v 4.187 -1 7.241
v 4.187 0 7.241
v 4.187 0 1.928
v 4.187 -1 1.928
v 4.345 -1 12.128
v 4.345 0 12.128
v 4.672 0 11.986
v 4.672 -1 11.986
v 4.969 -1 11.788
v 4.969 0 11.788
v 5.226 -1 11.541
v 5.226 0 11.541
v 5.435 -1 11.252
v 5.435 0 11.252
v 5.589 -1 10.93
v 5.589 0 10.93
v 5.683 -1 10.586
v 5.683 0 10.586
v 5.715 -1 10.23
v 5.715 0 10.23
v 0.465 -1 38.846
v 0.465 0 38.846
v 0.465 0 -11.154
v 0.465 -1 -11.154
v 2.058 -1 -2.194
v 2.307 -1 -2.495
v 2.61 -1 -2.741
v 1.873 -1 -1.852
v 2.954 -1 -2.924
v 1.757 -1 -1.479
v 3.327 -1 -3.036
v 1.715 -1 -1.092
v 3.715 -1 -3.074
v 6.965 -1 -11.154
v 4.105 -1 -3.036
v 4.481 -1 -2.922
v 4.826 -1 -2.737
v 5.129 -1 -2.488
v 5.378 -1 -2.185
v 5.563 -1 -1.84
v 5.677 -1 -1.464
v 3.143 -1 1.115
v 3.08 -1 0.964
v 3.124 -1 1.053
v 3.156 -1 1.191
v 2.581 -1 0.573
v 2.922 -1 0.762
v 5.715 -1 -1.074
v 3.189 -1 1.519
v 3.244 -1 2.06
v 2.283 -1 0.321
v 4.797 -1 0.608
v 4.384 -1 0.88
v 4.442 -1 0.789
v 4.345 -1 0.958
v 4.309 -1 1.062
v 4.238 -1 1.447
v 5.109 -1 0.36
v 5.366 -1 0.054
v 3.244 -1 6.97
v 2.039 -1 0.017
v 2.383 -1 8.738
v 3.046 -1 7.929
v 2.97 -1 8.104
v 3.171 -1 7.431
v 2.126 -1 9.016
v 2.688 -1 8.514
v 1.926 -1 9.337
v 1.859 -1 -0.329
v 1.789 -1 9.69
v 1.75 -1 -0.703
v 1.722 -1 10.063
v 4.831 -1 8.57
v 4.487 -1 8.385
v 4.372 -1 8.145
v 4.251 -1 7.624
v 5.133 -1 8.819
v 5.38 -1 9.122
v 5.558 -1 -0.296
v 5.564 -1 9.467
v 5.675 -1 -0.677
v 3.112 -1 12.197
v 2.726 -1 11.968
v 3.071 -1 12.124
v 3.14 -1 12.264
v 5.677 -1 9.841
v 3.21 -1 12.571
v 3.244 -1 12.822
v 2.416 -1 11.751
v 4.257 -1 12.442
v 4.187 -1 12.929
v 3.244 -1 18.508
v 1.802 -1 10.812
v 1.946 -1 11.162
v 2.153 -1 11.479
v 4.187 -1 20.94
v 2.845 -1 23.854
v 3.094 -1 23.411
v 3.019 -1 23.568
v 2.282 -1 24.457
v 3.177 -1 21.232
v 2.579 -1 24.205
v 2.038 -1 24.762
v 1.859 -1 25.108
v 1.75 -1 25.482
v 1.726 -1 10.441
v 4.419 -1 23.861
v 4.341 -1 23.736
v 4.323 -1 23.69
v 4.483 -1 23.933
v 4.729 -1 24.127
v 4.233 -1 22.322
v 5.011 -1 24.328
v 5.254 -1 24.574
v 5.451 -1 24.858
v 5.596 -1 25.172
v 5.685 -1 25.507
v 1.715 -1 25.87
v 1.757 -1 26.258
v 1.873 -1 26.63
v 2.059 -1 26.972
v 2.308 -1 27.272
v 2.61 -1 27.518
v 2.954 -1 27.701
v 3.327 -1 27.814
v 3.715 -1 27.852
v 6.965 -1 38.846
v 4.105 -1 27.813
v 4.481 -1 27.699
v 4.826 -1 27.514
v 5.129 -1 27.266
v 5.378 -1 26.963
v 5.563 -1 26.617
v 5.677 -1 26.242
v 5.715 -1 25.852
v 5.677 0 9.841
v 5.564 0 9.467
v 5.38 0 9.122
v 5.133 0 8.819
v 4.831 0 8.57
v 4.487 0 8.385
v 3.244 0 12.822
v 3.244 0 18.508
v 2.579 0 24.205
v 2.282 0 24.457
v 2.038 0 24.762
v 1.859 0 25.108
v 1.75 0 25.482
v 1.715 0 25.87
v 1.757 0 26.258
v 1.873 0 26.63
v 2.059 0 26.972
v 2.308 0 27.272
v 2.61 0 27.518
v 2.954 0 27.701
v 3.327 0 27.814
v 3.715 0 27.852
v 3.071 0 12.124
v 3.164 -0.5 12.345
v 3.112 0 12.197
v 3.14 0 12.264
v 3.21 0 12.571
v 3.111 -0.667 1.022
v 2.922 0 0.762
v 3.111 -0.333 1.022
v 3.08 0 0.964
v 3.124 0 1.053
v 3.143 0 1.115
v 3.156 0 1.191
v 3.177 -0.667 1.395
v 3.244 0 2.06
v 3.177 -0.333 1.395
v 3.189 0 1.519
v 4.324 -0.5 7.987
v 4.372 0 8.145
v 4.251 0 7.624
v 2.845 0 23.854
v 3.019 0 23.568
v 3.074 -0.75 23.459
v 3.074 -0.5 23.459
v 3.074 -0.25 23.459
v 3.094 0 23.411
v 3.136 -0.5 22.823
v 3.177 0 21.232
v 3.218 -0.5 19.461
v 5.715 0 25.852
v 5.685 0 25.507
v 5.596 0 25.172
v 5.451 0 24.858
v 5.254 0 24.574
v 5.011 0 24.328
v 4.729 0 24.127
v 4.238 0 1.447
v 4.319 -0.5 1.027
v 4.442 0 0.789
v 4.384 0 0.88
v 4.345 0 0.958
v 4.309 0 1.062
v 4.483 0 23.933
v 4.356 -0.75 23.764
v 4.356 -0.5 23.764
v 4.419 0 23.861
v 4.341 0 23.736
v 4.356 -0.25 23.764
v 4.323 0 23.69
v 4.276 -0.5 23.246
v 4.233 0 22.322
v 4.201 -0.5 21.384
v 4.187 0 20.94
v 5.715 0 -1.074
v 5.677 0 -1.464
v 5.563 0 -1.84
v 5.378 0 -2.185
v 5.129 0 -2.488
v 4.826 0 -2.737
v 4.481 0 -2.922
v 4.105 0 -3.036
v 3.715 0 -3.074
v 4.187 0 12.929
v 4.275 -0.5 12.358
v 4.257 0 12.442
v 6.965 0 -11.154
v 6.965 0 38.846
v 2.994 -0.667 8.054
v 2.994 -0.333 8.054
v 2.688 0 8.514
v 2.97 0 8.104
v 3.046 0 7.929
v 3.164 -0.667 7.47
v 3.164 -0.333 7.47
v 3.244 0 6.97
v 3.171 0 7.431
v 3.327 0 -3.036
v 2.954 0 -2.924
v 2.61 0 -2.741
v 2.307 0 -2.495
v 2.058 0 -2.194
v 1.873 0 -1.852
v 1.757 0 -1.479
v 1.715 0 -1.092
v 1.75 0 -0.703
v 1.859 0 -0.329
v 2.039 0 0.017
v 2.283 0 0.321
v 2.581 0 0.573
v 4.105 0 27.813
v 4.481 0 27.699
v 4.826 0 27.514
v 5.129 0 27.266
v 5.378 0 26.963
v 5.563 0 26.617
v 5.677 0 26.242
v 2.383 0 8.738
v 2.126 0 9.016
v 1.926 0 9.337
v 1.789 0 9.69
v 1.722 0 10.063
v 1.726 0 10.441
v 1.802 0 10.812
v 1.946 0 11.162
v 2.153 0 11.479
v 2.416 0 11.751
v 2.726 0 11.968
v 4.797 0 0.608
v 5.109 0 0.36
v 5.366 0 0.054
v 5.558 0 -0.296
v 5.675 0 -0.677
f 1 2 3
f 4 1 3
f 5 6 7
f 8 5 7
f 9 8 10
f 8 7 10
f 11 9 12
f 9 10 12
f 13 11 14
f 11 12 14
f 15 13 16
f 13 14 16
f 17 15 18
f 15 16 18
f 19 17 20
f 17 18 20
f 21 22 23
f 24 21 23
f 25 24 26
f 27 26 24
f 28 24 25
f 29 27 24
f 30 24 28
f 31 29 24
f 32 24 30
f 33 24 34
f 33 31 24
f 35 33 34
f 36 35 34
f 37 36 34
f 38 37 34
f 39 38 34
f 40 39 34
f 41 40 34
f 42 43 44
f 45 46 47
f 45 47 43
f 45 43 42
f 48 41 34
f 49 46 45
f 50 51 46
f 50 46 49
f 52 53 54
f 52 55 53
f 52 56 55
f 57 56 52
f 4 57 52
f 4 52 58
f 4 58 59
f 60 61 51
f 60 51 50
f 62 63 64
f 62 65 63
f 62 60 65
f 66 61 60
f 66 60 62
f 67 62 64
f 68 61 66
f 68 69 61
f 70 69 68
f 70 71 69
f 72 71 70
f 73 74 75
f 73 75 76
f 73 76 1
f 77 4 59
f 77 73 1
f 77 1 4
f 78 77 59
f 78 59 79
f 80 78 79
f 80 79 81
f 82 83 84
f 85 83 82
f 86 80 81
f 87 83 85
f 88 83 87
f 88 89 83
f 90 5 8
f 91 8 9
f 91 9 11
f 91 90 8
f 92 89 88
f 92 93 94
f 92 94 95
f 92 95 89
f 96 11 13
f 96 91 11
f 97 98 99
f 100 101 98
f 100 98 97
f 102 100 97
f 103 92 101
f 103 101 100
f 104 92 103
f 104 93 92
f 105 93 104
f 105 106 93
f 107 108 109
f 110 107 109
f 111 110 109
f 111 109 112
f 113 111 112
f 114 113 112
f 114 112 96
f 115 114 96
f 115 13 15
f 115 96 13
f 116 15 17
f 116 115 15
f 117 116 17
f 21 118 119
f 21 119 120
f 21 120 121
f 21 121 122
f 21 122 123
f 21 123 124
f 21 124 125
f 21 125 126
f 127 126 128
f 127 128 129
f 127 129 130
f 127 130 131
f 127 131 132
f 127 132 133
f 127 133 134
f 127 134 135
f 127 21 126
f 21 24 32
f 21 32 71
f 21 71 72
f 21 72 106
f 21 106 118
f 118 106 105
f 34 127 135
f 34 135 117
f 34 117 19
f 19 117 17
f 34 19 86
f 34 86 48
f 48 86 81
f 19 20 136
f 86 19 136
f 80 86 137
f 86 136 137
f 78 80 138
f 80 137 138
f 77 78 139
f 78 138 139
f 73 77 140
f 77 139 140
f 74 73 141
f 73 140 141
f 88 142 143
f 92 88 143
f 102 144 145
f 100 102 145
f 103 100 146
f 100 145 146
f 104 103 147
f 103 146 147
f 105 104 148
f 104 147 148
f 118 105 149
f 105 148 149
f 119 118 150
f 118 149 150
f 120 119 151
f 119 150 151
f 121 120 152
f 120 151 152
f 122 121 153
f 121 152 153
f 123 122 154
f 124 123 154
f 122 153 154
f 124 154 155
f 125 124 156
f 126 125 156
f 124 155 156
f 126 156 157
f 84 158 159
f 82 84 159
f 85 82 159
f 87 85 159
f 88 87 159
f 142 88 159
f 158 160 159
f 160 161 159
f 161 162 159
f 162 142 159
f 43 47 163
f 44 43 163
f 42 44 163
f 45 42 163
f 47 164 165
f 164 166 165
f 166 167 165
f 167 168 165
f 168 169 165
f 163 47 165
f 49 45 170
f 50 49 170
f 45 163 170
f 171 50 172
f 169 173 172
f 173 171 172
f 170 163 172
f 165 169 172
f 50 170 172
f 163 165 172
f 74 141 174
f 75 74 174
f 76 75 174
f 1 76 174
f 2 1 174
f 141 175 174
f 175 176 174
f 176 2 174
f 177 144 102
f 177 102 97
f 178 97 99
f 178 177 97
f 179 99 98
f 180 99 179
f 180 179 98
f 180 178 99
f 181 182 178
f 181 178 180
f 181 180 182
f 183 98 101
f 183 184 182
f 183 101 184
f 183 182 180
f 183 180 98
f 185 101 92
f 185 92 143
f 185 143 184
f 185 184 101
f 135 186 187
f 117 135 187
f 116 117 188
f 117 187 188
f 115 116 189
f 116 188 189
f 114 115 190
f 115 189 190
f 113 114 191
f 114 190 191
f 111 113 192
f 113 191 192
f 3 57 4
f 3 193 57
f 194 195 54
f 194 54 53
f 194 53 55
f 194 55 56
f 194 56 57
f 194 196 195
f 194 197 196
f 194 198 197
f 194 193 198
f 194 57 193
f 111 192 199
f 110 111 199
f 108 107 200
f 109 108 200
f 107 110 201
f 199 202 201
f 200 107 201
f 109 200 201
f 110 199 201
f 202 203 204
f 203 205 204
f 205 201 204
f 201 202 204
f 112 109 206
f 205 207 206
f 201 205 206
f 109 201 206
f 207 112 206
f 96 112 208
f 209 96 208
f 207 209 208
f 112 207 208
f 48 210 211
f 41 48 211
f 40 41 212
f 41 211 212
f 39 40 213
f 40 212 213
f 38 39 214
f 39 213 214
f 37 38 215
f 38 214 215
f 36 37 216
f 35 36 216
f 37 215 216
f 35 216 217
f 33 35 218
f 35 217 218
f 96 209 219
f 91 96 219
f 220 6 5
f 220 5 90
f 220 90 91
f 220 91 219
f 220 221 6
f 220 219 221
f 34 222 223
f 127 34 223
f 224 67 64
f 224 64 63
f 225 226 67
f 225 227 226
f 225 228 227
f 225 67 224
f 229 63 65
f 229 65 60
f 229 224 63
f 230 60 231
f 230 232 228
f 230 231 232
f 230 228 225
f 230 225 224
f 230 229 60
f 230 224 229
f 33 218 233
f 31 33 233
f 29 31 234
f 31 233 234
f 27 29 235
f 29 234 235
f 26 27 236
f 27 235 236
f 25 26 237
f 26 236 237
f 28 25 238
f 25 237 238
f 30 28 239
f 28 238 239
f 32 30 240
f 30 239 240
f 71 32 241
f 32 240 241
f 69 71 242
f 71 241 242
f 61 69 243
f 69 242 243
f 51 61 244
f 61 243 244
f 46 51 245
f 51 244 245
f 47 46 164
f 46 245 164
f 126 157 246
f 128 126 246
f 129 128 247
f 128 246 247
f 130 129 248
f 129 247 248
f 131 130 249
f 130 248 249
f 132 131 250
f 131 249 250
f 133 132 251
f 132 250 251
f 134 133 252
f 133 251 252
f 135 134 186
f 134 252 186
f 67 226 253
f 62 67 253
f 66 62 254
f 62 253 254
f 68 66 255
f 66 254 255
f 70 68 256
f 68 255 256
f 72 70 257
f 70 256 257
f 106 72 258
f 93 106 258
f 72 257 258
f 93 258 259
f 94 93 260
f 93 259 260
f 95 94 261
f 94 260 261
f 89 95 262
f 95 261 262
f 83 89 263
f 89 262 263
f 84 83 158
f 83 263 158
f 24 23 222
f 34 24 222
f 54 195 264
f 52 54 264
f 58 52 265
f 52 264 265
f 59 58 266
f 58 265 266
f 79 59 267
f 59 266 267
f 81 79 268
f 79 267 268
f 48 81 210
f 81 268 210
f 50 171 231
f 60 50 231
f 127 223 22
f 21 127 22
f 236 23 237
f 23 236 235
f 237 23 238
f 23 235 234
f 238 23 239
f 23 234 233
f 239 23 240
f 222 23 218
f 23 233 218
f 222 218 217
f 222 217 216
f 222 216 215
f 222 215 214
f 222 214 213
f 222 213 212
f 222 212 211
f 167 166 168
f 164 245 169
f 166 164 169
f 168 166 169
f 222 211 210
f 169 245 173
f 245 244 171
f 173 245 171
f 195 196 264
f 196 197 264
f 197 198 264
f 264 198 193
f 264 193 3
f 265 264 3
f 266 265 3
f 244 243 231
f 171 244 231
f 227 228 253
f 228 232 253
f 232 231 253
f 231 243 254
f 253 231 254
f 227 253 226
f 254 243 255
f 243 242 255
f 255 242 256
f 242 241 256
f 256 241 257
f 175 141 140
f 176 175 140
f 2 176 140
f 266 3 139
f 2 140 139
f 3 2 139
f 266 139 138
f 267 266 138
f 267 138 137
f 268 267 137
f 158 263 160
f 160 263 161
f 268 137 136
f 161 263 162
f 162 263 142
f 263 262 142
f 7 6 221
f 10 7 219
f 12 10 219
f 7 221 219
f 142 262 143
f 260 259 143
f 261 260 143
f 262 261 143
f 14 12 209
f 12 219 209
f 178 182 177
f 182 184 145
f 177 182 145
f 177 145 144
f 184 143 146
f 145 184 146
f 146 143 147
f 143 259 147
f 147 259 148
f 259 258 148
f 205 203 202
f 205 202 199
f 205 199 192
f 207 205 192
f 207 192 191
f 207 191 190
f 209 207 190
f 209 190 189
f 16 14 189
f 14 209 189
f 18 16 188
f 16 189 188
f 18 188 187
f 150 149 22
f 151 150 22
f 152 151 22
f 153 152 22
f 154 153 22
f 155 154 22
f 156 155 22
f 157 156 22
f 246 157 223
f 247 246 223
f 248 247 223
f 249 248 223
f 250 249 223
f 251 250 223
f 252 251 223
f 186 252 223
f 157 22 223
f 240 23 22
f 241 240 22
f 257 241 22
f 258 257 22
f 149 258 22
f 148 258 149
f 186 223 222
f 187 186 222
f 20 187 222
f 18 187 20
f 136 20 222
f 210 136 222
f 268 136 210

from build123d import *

# Parameters (mm, degrees)
F1_DEPTH = 1


with BuildPart() as f1:
    # F0 (on Front) → F1 (new body)
    with BuildSketch(Plane.XZ):
        with BuildLine():
            Line((6.9652427249, 38.8462082677), (3.7152427249, 38.8462082677))
            Line((3.7152427249, 38.8462082677), (3.7152427249, 27.8515086025))
            ThreePointArc((3.7152427249, 27.8515086025), (5.1294562872, 27.2657221649), (5.7152427249, 25.8515086025))
            ThreePointArc((5.7152427249, 25.8515086025), (5.4512631212, 24.8584158659), (4.7290095414, 24.1274793563))
            add(Edge.make_bspline(
                [(4.7290095414, 24.1274793563), (4.6275814273, 24.0540127102), (4.4534828395, 23.9289265376), (4.3408488044, 23.740002592), (4.2600879604, 23.5865160499), (4.1892384813, 20.9718360692), (4.1867544714, 20.9396667778)],
                knots=[0, 0, 0, 0, 0.181913127, 0.311422295, 0.4704236336, 0.9640158841, 0.9640158841, 0.9640158841, 0.9640158841], degree=3))
            Line((4.1867544714, 20.9396667778), (4.1867544714, 12.9285128787))
            add(Edge.make_bspline(
                [(4.3445135127, 12.1284830822), (4.3206430175, 12.1963615575), (4.2585512669, 12.3676925683), (4.2141467595, 12.716496961), (4.1867544714, 12.9285128787)],
                knots=[0, 0, 0, 0, 0.391917688, 1, 1, 1, 1], degree=3))
            ThreePointArc((4.3445135127, 12.1284830822), (5.3367453576, 11.4008393265), (5.7152427249, 10.2300578728))
            ThreePointArc((5.7152427249, 10.2300578728), (5.3801968888, 9.1219389118), (4.487315093, 8.3850905944))
            add(Edge.make_bspline(
                [(4.487315093, 8.3850905944), (4.43193928, 8.2877334657), (4.3015903456, 8.0631310006), (4.1956594664, 7.2533478123), (4.1867544714, 7.2411531582)],
                knots=[0, 0, 0, 0, 0.3744364892, 0.8713347964, 0.8713347964, 0.8713347964, 0.8713347964], degree=3))
            Line((4.1867544714, 7.2411531582), (4.1867544714, 1.9279832486))
            add(Edge.make_bspline(
                [(4.4415181477, 0.7892925805), (4.3981735735, 0.8543018415), (4.2735271616, 1.0374486552), (4.2211849783, 1.5777627439), (4.1867544714, 1.9279832486)],
                knots=[0, 0, 0, 0, 0.351412562, 1, 1, 1, 1], degree=3))
            ThreePointArc((4.4415181477, 0.7892925805), (5.366386396, 0.0544156939), (5.7152427249, -1.0741783772))
            ThreePointArc((5.7152427249, -1.0741783772), (5.1294562872, -2.4883919395), (3.7152427249, -3.0741783772))
            Line((3.7152427249, -3.0741783772), (3.7152427249, -11.1537917323))
            Line((3.7152427249, -11.1537917323), (6.9652427249, -11.1537917323))
            Line((6.9652427249, -11.1537917323), (6.9652427249, 38.8462082677))
        make_face()
        with BuildLine():
            Line((3.7152427249, 38.8462082677), (0.4652427249, 38.8462082677))
            Line((0.4652427249, 38.8462082677), (0.4652427249, -11.1537917323))
            Line((0.4652427249, -11.1537917323), (3.7152427249, -11.1537917323))
            Line((3.7152427249, -11.1537917323), (3.7152427249, -3.0741783772))
            ThreePointArc((3.7152427249, -3.0741783772), (1.7567068491, -1.4793169008), (2.9217643917, 0.7616843995))
            add(Edge.make_bspline(
                [(2.9217643917, 0.7616843995), (2.9955967273, 0.8476569647), (3.1508691278, 1.0251115313), (3.167451117, 1.3534791692), (3.2398210206, 1.9935589713), (3.2437309783, 2.0598154515)],
                knots=[0, 0, 0, 0, 0.2663982123, 0.5557276571, 0.939692774, 0.939692774, 0.939692774, 0.939692774], degree=3))
            Line((3.2437309783, 2.0598154515), (3.2437309783, 2.076294506))
            Line((3.2437309783, 2.076294506), (3.2437309783, 6.9700689055))
            add(Edge.make_bspline(
                [(2.6882127608, 8.5138966179), (2.8011224892, 8.3700023623), (3.0325699865, 8.0750413717), (3.1715890881, 7.4708940219), (3.2204332845, 7.1318067002), (3.2437309783, 6.9700689055)],
                knots=[0, 0, 0, 0, 0.3325269413, 0.6816288502, 1, 1, 1, 1], degree=3))
            ThreePointArc((2.6882127608, 8.5138966179), (1.726422686, 10.4412328079), (3.0714972614, 12.1236237624))
            add(Edge.make_bspline(
                [(3.0714972614, 12.1236237624), (3.103239621, 12.1784670425), (3.1810934977, 12.3097082252), (3.240827298, 12.7795572617), (3.2437309783, 12.8223551437)],
                knots=[0, 0, 0, 0, 0.382674986, 0.9264954646, 0.9264954646, 0.9264954646, 0.9264954646], degree=3))
            Line((3.2437309783, 12.8223551437), (3.2437309783, 12.8312017769))
            Line((3.2437309783, 12.8312017769), (3.2437309783, 18.5076836497))
            add(Edge.make_bspline(
                [(2.5792201528, 24.2054670733), (2.6882127608, 24.0671992935), (2.8899452233, 23.8124403077), (3.102442087, 23.4168815454), (3.1406473815, 23.221008711), (3.2302419226, 18.7396546183), (3.2437309783, 18.5076836497)],
                knots=[0, 0, 0, 0, 0.1492513665, 0.2755733309, 0.3988645385, 0.8416932228, 0.8416932228, 0.8416932228, 0.8416932228], degree=3))
            ThreePointArc((2.5792201528, 24.2054670733), (1.8057816676, 26.446452693), (3.7152427249, 27.8515086025))
            Line((3.7152427249, 27.8515086025), (3.7152427249, 38.8462082677))
        make_face()
    extrude(amount=F1_DEPTH)


solid = f1.part
